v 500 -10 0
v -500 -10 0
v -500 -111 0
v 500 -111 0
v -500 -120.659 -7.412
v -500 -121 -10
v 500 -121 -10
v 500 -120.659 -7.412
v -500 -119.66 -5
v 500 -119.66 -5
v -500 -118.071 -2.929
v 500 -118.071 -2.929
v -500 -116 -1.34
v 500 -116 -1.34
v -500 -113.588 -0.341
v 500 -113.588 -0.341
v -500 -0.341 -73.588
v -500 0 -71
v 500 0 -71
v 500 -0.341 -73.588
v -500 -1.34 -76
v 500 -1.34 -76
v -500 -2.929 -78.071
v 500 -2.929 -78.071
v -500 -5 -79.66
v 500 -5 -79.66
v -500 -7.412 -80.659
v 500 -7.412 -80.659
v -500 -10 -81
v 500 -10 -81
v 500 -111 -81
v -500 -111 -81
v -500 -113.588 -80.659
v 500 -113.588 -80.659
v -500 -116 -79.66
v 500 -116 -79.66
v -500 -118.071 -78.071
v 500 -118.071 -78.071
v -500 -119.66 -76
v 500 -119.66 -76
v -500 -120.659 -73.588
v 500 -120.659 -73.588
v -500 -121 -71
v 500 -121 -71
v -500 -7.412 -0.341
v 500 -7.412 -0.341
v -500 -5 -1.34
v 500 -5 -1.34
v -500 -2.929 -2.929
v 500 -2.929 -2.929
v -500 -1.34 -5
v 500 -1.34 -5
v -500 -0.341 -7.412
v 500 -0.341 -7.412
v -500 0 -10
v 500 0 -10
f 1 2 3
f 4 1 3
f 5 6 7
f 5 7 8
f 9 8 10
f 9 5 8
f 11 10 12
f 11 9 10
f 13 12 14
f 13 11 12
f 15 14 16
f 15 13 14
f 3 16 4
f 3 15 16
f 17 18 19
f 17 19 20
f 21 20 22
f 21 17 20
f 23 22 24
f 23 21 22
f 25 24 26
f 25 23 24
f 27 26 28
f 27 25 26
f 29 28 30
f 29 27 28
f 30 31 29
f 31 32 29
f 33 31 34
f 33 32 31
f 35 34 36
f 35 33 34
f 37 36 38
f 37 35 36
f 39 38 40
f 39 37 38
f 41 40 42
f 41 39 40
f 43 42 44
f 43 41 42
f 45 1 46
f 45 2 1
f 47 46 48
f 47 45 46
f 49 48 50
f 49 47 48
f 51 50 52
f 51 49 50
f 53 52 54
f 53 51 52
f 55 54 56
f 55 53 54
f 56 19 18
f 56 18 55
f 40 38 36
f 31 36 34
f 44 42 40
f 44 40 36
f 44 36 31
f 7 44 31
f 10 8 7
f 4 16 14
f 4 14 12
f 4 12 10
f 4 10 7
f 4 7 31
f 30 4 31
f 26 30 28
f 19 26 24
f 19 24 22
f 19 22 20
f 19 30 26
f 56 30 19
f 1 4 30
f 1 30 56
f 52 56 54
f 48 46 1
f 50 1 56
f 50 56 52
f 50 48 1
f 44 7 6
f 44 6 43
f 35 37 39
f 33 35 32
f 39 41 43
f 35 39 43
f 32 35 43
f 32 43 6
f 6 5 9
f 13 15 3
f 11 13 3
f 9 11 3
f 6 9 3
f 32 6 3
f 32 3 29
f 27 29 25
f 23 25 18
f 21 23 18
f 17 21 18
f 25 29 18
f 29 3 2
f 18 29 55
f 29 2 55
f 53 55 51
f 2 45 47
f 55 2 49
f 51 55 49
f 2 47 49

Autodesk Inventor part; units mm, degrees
ref_plane "YZ Plane" through (0, 0, 0) normal (1, 0, 0) x (0, 1, 0)
ref_plane "XZ Plane" through (0, 0, 0) normal (0, 1, 0) x (-1, 0, 0)
ref_plane "XY Plane" through (0, 0, 0) normal (0, 0, 1) x (1, 0, 0)
sketch "Sketch1" plane through (0, 0, 0) normal (1, 0, 0) x (0, 1, 0)
  line L0 (-10, 0) -> (-111, 0)
  line L1 (-121, -10) -> (-121, -71)
  line L2 (-111, -81) -> (-10, -81)
  line L3 (0, -71) -> (0, -10)
  arc A0 (0, -10) -> (-10, 0) centre (-10, -10) ccw
  arc A1 (-10, -81) -> (0, -71) centre (-10, -71) ccw
  arc A2 (-121, -71) -> (-111, -81) centre (-111, -71) ccw
  arc A3 (-111, 0) -> (-121, -10) centre (-111, -10) ccw
  point P0 (0, 0)
  point P1 (-121, -81)
  point P2 (0, -81)
  dimension "d0" = 121
  dimension "d1" = 81
  dimension "d2" = 10
extrude "Extrusion1" add sketch "Sketch1" along normal mid plane 1000
properties part number "Beam"
